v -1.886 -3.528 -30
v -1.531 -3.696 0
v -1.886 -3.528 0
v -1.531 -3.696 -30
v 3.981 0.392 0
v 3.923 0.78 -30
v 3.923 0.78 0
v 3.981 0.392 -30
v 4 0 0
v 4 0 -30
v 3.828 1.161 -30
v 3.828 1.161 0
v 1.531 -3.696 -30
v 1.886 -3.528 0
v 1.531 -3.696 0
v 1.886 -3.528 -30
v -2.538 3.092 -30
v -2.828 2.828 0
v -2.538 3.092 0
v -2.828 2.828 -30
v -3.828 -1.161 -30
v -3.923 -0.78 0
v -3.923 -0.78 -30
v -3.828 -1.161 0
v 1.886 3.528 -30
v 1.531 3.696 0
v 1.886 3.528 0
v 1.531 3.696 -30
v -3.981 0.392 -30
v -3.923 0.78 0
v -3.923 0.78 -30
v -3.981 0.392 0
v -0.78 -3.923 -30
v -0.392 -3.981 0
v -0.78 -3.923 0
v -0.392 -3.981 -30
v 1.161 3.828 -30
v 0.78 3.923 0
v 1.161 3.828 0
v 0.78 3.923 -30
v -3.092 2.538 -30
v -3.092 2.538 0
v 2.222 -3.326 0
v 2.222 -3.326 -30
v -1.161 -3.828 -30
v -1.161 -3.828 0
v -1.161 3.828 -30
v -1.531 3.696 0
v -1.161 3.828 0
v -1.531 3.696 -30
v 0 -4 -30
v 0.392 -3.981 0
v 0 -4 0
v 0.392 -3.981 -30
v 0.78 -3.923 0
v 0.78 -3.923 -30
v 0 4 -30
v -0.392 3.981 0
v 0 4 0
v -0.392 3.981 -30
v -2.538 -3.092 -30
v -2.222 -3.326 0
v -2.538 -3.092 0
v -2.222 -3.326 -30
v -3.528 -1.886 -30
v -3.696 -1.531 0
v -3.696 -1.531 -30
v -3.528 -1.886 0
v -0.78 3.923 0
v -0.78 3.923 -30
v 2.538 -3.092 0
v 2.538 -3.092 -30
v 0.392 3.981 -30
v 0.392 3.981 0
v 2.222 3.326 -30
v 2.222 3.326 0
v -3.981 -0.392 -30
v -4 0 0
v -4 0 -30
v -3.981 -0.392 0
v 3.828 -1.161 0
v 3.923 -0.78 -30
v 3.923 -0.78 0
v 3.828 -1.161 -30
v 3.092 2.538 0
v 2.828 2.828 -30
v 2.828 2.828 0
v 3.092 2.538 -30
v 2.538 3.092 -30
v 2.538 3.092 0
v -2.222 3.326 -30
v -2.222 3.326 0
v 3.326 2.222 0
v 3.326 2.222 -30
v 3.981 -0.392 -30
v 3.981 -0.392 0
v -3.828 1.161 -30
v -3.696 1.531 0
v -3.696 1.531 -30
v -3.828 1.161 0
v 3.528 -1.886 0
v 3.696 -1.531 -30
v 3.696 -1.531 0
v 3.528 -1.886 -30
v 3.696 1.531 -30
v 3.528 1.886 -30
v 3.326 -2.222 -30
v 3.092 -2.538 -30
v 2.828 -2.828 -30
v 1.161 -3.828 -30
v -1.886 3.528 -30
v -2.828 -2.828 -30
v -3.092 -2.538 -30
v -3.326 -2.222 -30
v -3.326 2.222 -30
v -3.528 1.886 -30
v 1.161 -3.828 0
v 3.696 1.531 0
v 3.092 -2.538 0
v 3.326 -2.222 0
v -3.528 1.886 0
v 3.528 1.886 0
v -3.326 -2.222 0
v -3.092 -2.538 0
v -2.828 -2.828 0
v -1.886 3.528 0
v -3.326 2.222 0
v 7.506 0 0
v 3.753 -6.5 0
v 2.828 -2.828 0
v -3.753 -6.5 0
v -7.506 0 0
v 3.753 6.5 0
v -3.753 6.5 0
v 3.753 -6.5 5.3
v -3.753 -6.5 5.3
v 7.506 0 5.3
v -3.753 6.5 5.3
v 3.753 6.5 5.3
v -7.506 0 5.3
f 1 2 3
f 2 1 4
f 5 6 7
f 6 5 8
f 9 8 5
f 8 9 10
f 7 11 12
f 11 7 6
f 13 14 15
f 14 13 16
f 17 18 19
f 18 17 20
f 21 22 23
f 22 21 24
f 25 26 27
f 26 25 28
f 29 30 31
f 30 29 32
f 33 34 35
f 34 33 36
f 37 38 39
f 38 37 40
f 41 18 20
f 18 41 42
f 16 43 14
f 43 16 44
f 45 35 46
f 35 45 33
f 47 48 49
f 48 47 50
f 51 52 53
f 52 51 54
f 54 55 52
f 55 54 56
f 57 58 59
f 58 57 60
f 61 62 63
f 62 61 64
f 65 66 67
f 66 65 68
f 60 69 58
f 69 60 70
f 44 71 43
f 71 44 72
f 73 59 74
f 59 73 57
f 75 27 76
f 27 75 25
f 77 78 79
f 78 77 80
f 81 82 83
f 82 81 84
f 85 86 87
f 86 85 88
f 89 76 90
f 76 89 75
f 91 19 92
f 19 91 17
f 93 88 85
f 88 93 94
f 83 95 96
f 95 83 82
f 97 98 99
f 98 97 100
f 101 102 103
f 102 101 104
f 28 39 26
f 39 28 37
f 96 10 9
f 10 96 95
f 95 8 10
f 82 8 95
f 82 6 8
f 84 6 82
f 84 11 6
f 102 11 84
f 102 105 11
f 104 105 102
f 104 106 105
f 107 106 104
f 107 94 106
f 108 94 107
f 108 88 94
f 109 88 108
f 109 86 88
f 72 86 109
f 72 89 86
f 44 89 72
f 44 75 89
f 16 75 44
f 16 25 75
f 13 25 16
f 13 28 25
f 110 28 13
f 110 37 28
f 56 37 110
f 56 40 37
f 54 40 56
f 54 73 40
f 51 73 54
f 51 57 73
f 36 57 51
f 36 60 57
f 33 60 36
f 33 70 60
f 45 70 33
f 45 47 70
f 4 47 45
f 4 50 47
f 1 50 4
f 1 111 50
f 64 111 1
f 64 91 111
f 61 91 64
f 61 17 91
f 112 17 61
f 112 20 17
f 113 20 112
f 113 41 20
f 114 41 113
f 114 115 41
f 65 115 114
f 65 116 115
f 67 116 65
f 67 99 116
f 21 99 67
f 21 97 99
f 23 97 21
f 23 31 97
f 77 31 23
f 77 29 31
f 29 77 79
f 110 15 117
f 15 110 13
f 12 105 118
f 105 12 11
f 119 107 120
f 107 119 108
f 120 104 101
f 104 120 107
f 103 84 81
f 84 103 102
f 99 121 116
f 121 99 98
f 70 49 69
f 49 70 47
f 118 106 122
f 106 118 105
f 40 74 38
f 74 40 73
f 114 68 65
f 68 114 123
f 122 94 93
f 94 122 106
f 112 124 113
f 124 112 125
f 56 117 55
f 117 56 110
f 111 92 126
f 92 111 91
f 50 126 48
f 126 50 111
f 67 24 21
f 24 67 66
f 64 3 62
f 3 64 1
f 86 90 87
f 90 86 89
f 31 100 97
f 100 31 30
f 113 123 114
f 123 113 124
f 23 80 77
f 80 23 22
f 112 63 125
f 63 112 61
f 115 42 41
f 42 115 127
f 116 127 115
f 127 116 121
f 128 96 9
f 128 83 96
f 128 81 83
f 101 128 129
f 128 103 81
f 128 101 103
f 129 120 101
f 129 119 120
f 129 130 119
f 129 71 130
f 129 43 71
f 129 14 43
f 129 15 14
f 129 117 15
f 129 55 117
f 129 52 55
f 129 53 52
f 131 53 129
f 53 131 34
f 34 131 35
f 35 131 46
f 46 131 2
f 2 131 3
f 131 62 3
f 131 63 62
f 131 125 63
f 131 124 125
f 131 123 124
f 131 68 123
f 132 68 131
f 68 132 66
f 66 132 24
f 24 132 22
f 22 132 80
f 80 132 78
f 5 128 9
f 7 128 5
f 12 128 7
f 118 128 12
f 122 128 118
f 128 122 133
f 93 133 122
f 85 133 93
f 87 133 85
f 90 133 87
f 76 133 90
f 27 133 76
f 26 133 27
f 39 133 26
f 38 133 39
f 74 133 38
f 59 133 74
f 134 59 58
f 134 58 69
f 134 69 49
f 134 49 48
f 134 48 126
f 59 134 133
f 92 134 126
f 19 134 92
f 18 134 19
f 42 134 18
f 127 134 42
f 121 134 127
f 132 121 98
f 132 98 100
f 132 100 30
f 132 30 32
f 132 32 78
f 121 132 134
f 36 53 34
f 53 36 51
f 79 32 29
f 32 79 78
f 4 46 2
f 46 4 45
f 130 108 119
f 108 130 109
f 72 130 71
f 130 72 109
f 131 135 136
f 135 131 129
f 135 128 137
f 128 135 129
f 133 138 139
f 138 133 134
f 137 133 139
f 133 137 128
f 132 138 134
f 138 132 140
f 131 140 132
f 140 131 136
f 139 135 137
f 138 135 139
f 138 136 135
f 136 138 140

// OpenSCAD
$fn = 64;

// シャンク（軸部）: 直径 8mm、長さ 30mm、z < 0 側へ配置
translate([0, 0, -30]) {
    cylinder(h = 30, d = 8);
}

// 頭部: 対辺距離 13mm、高さ 5.3mm、z >= 0 側へ配置
// 六角柱の外接円半径 = (対辺距離 / 2) / cos(30)
cylinder(h = 5.3, r = (13 / 2) / cos(30), $fn = 6);
